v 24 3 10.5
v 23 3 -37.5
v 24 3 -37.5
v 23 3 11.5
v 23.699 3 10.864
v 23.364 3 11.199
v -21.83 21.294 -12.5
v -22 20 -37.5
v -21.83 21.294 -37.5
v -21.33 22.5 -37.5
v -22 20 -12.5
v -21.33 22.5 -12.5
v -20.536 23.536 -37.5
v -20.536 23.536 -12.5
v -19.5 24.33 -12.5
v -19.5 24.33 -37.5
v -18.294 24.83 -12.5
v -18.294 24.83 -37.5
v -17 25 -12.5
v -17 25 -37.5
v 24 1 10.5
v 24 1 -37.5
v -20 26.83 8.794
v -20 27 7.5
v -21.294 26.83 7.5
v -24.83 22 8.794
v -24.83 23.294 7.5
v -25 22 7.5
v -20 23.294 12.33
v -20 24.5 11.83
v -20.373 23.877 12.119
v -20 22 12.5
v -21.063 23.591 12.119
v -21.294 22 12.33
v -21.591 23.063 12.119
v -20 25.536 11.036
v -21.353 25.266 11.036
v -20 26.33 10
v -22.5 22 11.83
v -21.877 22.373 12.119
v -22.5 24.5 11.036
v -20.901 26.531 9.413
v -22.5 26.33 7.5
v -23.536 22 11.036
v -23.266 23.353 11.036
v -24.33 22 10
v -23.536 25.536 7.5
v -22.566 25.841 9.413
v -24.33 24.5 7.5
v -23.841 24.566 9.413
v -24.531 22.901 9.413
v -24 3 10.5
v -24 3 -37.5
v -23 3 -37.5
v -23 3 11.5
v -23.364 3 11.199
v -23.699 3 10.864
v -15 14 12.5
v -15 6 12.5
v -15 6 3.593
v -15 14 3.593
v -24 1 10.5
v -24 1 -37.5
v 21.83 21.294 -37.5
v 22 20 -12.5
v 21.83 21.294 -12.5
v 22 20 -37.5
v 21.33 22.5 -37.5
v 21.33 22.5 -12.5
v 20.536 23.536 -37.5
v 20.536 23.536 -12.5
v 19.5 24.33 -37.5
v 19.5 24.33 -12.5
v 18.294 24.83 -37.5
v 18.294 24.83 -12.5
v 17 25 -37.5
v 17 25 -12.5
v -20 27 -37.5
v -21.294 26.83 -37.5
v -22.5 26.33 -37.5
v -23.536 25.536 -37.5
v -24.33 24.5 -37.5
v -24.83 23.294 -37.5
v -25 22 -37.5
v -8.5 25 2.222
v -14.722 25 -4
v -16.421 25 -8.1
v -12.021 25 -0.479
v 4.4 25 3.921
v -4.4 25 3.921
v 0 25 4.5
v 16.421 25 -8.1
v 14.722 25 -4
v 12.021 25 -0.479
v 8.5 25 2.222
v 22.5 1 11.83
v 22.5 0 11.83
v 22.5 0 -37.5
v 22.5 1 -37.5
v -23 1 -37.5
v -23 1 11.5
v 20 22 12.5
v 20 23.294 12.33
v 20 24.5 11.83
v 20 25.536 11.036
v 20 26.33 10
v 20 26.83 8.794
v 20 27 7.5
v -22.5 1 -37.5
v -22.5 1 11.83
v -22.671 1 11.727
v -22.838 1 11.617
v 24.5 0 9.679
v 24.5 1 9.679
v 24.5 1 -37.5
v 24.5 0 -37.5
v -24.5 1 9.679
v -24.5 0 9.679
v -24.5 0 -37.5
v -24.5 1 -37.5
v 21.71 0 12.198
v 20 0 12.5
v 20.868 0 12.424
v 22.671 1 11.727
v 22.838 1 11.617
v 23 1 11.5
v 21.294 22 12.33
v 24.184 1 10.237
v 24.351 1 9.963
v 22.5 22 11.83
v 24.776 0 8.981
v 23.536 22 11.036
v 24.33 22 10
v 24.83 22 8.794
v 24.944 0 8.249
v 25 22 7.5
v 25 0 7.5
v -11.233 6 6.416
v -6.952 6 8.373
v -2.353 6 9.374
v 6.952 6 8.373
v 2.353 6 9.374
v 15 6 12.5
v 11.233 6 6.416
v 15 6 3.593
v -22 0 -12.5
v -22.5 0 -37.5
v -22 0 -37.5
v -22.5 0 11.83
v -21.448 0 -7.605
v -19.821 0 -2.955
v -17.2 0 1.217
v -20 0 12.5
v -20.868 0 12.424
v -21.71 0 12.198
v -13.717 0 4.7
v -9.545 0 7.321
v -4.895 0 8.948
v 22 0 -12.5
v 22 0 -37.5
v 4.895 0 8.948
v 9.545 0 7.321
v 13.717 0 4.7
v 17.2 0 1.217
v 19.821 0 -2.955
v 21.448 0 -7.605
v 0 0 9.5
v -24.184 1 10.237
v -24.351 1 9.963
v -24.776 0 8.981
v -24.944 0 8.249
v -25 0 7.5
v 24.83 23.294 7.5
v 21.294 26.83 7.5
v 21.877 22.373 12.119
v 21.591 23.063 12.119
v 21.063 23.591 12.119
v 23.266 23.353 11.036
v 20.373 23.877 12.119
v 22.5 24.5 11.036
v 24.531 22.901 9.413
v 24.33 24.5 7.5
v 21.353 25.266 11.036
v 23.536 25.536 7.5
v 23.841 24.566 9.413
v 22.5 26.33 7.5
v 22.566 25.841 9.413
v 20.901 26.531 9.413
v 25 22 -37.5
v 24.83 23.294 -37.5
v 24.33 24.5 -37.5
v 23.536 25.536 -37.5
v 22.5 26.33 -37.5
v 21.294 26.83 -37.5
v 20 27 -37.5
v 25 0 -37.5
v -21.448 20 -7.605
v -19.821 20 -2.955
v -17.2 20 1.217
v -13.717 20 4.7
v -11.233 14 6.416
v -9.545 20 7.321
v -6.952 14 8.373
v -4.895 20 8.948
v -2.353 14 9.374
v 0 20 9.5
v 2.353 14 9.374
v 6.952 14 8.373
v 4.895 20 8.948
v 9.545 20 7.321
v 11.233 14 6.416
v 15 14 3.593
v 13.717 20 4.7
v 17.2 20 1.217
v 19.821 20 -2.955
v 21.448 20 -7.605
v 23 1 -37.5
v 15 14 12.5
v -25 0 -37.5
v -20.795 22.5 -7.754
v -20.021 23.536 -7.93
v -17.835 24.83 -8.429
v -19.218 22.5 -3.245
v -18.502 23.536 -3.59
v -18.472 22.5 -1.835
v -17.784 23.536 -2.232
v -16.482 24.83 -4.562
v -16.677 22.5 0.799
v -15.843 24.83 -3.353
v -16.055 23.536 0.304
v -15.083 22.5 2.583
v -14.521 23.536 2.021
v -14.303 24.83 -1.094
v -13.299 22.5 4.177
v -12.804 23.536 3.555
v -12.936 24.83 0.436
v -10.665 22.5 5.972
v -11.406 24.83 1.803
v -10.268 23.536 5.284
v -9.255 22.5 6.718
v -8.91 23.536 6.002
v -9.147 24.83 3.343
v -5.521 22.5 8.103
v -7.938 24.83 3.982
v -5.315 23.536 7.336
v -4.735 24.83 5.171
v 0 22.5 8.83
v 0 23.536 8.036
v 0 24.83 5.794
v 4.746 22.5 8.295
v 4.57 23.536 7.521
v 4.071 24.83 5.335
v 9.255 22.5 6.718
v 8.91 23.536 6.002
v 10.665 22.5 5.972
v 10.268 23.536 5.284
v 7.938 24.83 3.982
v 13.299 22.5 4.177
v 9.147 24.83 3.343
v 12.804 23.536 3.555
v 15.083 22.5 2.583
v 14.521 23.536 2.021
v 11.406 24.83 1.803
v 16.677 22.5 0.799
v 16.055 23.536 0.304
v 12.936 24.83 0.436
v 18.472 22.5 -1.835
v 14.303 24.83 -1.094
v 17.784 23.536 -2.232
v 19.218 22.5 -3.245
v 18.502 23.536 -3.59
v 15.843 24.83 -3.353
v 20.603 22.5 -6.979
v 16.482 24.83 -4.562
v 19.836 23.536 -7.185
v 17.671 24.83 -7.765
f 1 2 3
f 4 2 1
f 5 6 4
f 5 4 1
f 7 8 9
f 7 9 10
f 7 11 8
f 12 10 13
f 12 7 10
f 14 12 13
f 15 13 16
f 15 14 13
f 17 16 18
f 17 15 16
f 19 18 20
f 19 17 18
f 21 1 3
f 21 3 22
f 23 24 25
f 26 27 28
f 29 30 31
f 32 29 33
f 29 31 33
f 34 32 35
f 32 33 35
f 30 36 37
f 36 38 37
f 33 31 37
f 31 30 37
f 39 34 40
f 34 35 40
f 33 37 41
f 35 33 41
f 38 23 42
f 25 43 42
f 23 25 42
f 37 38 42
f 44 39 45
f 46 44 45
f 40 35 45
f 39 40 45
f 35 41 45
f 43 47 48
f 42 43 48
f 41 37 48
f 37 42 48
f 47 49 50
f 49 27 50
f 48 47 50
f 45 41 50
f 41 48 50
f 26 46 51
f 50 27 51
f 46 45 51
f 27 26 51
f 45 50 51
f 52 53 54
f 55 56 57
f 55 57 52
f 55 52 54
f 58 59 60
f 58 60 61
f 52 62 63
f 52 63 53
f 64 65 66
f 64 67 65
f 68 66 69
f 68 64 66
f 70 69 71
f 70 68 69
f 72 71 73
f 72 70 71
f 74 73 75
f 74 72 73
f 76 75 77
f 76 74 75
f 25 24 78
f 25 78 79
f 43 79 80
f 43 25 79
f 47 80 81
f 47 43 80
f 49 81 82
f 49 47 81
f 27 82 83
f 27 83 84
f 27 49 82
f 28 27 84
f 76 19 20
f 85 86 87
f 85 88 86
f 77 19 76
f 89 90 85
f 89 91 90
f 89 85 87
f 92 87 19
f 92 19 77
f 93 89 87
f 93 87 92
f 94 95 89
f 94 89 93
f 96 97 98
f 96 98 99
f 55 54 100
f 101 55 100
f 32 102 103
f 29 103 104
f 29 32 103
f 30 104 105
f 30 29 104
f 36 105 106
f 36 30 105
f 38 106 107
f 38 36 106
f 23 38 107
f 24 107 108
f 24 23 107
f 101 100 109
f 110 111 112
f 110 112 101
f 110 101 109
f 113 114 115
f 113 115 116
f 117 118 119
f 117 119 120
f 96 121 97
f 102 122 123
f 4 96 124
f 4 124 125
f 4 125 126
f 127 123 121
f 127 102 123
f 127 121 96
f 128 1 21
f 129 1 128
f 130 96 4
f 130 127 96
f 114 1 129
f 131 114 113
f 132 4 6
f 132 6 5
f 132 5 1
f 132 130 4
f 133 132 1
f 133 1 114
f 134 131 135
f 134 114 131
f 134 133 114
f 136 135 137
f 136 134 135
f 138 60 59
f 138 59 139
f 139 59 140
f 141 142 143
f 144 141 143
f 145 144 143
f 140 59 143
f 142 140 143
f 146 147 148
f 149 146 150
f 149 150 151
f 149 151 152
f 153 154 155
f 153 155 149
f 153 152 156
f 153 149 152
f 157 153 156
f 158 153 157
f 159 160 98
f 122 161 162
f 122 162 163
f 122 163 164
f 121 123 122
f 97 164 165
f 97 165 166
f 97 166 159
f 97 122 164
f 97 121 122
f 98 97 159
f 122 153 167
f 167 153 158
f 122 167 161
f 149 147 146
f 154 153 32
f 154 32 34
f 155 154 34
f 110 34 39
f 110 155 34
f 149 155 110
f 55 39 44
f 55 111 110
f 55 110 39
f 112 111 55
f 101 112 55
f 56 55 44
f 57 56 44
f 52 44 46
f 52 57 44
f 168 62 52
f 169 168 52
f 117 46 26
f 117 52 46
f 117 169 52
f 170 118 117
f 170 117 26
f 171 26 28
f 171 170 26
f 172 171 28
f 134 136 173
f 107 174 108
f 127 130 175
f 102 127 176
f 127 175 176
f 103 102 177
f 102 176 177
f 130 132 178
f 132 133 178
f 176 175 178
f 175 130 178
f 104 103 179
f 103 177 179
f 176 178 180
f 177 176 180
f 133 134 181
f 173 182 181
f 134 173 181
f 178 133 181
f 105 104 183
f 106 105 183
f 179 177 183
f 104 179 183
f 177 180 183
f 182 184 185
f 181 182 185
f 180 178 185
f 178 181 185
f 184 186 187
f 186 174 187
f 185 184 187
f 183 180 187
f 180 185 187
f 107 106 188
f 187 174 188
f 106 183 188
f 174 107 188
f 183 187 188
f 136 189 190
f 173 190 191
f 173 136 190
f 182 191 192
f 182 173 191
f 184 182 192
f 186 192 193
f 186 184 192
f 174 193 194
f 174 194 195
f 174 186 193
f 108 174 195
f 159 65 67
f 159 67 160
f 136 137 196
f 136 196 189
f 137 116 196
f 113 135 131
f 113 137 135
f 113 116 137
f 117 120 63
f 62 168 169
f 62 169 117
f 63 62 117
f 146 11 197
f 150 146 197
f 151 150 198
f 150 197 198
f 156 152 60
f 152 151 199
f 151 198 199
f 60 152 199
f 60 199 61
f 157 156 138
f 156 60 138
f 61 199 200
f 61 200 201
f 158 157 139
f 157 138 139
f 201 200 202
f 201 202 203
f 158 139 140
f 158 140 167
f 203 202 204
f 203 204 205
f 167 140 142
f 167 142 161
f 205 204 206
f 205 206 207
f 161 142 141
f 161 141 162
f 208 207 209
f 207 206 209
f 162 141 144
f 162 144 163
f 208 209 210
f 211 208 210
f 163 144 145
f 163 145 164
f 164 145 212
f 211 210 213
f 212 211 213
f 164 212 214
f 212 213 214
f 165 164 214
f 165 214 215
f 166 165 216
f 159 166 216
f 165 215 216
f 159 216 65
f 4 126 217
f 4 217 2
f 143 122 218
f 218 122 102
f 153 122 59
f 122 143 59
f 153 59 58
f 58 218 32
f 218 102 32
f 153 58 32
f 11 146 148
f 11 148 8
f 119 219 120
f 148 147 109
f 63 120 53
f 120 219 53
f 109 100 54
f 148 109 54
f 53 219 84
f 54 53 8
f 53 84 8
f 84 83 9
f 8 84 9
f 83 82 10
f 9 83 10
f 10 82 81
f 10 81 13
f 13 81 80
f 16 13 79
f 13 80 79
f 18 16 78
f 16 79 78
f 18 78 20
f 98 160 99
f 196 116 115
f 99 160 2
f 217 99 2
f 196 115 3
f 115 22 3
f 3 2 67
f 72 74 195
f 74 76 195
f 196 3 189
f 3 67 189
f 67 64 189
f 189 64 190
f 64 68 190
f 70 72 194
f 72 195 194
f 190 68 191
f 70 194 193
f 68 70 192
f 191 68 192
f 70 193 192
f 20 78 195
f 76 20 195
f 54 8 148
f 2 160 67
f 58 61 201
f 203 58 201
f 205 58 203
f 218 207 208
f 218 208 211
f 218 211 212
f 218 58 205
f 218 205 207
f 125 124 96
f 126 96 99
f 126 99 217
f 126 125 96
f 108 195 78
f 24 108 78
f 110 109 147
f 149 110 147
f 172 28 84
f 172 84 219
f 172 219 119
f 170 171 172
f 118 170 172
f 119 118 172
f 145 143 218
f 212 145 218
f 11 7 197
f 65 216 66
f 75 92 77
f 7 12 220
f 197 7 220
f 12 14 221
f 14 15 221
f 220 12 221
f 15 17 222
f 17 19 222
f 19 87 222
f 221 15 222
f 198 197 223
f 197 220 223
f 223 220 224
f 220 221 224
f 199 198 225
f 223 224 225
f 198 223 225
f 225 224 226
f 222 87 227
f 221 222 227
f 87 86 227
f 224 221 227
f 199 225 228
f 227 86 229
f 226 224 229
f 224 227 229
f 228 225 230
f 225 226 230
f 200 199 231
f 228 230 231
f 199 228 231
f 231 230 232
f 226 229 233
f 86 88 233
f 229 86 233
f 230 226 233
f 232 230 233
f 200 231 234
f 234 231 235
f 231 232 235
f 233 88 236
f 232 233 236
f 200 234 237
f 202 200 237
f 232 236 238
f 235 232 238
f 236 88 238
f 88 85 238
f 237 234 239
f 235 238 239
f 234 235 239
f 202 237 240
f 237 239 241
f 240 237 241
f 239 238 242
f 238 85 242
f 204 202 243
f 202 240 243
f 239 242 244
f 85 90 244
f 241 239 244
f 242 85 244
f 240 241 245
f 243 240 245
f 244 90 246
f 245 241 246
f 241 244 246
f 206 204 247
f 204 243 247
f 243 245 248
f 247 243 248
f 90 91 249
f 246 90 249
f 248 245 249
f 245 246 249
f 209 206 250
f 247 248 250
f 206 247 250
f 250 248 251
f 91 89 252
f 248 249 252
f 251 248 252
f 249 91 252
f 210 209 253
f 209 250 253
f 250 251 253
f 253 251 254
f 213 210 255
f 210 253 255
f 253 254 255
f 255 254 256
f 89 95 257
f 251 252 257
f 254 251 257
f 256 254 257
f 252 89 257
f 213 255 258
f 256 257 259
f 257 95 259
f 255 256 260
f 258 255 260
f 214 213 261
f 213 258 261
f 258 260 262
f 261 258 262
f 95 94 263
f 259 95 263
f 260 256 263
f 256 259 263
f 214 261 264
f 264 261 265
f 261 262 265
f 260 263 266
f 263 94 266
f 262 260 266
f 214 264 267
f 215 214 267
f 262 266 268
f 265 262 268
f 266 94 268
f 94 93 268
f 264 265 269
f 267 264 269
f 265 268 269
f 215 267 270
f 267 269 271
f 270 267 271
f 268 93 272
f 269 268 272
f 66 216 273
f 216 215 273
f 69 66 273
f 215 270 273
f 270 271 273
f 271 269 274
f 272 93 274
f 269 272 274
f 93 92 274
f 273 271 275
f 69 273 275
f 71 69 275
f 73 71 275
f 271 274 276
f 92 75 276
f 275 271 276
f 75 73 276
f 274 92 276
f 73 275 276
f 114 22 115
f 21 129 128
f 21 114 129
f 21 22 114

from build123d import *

# Parameters (mm, degrees)
CROQUIS1_W              = 60
CROQUIS1_H              = 25
SALIENTE_EXTRUIR1_DEPTH = 25
CROQUIS2_R              = 22
CORTAR_EXTRUIR1_DEPTH   = 25
CROQUIS3_W              = 39.331186887
CROQUIS3_H              = 32.545982132
CORTAR_EXTRUIR6_DEPTH   = 5
CROQUIS6_W              = 71.754194534
CROQUIS6_H              = 47.315533904
CORTAR_EXTRUIR7_DEPTH   = 5
CROQUIS7_W              = 50
CROQUIS7_H              = 25
SALIENTE_EXTRUIR2_DEPTH = 2
CORTAR_EXTRUIR9_DEPTH   = 38
CORTAR_EXTRUIR11_DEPTH  = 31
CROQUIS11_W             = 1
CROQUIS11_H             = 2
SALIENTE_EXTRUIR3_DEPTH = 25
CORTAR_EXTRUIR12_DEPTH  = 25
SALIENTE_EXTRUIR4_DEPTH = 25
CROQUIS14_W             = 30
CROQUIS14_H             = 8
CORTAR_EXTRUIR15_DEPTH  = 22
REDONDEO4_R             = 5
REDONDEO5_R             = 5


with BuildPart() as part:
    # Croquis1 → Saliente-Extruir1 (new body)
    with BuildSketch(Plane(origin=(0, 0, 0), x_dir=(1, 0, 0), z_dir=(0, 1, 0))):
        Rectangle(CROQUIS1_W, CROQUIS1_H)
    extrude(amount=SALIENTE_EXTRUIR1_DEPTH)

    # Croquis2 → Cortar-Extruir1 (cut)
    with BuildSketch(Plane(origin=(0, 25, 0), x_dir=(1, 0, 0), z_dir=(0, 1, 0))):
        with Locations((0, 12.5)):
            Circle(CROQUIS2_R)
    extrude(amount=-CORTAR_EXTRUIR1_DEPTH, mode=Mode.SUBTRACT)

    # Croquis3 → Cortar-Extruir6 (cut)
    with BuildSketch(Plane(origin=(30, 0, 0), x_dir=(0, 0, -1), z_dir=(1, 0, 0))):
        with Locations((0.690020822, 11.469590882)):
            Rectangle(CROQUIS3_W, CROQUIS3_H)
    extrude(amount=-CORTAR_EXTRUIR6_DEPTH, mode=Mode.SUBTRACT)

    # Croquis6 → Cortar-Extruir7 (cut)
    with BuildSketch(Plane.ZY.offset(30)):
        with Locations((-5.334444443, 15.165040004)):
            Rectangle(CROQUIS6_W, CROQUIS6_H)
    extrude(amount=-CORTAR_EXTRUIR7_DEPTH, mode=Mode.SUBTRACT)

    # Croquis7 → Saliente-Extruir2 (add)
    with BuildSketch(Plane(origin=(0, 25, 0), x_dir=(1, 0, 0), z_dir=(0, 1, 0))):
        Rectangle(CROQUIS7_W, CROQUIS7_H)
    extrude(amount=SALIENTE_EXTRUIR2_DEPTH)

    # Croquis8 → Cortar-Extruir9 (cut)
    with BuildSketch(Plane(origin=(0, 0, -12.5), x_dir=(-1, 0, 0), z_dir=(0, 0, -1))):
        Polygon((-23.5, 0), (-23, 0), (-23, 3), (-24, 3), (-24, 0), align=None)
        Polygon((24, 0), (23.5, 0), (23, 0), (23, 3), (24, 3), align=None)
    extrude(amount=-CORTAR_EXTRUIR9_DEPTH, mode=Mode.SUBTRACT)

    # Croquis10 → Cortar-Extruir11 (cut)
    with BuildSketch(Plane(origin=(0, 0, -12.5), x_dir=(-1, 0, 0), z_dir=(0, 0, -1))):
        Polygon((23, 0), (24, 0), (24.465135072, 0), (24.465135072, 1), (22.465135072, 1), (22.465135072, 0), align=None)
        Polygon((-22.465135072, 0), (-22.465135072, 1), (-24.465135072, 1), (-24.465135072, 0), (-24, 0), (-23, 0), align=None)
    extrude(amount=-CORTAR_EXTRUIR11_DEPTH, mode=Mode.SUBTRACT)

    # Croquis11 → Saliente-Extruir3 (add)
    with BuildSketch(Plane(origin=(0, 0, -12.5), x_dir=(-1, 0, 0), z_dir=(0, 0, -1))):
        Polygon((22.465135072, 1), (22.465135072, 0), (24.465135072, 0), (24.465135072, 1), (24, 1), (23, 1), align=None)
        with Locations((23.5, 2)):
            Rectangle(CROQUIS11_W, CROQUIS11_H)
        Polygon((-23, 1), (-24, 1), (-24.465135072, 1), (-24.465135072, 0), (-22.465135072, 0), (-22.465135072, 1), align=None)
        with Locations((-23.5, 2)):
            Rectangle(CROQUIS11_W, CROQUIS11_H)
    extrude(amount=-SALIENTE_EXTRUIR3_DEPTH)

    # Croquis12 → Cortar-Extruir12 (cut)
    with BuildSketch(Plane(origin=(0, 0, -12.5), x_dir=(-1, 0, 0), z_dir=(0, 0, -1))):
        Polygon((-22.5, 0), (-24.5, 0), (-24.5, 1), (-24, 1), (-24, 3), (-23, 3), (-23, 1), (-22.5, 1), align=None)
        Polygon((24, 3), (23, 3), (23, 1), (22.5, 1), (22.5, 0), (24.5, 0), (24.5, 1), (24, 1), align=None)
    extrude(amount=-CORTAR_EXTRUIR12_DEPTH, mode=Mode.SUBTRACT)

    # Croquis13 → Saliente-Extruir4 (add)
    with BuildSketch(Plane(origin=(0, 0, -12.5), x_dir=(-1, 0, 0), z_dir=(0, 0, -1))):
        Polygon((-22, 0), (-22.5, 0), (-22.5, 1), (-23, 1), (-23, 3), (-24, 3), (-24, 1), (-24.5, 1), (-24.5, 0), (-25, 0), (-25, 27), (25, 27), (25, 0), (24.5, 0), (24.5, 1), (24, 1), (24, 3), (23, 3), (23, 1), (22.5, 1), (22.5, 0), (22, 0), (22, 25), (-22, 25), align=None)
    extrude(amount=SALIENTE_EXTRUIR4_DEPTH)

    # Croquis14 → Cortar-Extruir15 (cut)
    with BuildSketch(Plane.XY.offset(12.5)):
        with Locations((0, 10)):
            Rectangle(CROQUIS14_W, CROQUIS14_H)
    extrude(amount=-CORTAR_EXTRUIR15_DEPTH, mode=Mode.SUBTRACT)

    # Redondeo4
    redondeo4_edges = [part.edges().sort_by_distance(p)[0] for p in [
        (0, 25, 9.5),
        (-22, 25, -25),
        (22, 25, -25),
        (-25, 27, -12.5),
        (25, 27, -12.5),
    ]]
    fillet(redondeo4_edges, radius=REDONDEO4_R)

    # Redondeo5
    redondeo5_edges = [part.edges().sort_by_distance(p)[0] for p in [
        (-23.535533906, 25.535533906, 12.5),
        (23.535533906, 25.535533906, 12.5),
        (-25, 11, 12.5),
        (0, 27, 12.5),
        (25, 11, 12.5),
    ]]
    fillet(redondeo5_edges, radius=REDONDEO5_R)


solid = part.part
